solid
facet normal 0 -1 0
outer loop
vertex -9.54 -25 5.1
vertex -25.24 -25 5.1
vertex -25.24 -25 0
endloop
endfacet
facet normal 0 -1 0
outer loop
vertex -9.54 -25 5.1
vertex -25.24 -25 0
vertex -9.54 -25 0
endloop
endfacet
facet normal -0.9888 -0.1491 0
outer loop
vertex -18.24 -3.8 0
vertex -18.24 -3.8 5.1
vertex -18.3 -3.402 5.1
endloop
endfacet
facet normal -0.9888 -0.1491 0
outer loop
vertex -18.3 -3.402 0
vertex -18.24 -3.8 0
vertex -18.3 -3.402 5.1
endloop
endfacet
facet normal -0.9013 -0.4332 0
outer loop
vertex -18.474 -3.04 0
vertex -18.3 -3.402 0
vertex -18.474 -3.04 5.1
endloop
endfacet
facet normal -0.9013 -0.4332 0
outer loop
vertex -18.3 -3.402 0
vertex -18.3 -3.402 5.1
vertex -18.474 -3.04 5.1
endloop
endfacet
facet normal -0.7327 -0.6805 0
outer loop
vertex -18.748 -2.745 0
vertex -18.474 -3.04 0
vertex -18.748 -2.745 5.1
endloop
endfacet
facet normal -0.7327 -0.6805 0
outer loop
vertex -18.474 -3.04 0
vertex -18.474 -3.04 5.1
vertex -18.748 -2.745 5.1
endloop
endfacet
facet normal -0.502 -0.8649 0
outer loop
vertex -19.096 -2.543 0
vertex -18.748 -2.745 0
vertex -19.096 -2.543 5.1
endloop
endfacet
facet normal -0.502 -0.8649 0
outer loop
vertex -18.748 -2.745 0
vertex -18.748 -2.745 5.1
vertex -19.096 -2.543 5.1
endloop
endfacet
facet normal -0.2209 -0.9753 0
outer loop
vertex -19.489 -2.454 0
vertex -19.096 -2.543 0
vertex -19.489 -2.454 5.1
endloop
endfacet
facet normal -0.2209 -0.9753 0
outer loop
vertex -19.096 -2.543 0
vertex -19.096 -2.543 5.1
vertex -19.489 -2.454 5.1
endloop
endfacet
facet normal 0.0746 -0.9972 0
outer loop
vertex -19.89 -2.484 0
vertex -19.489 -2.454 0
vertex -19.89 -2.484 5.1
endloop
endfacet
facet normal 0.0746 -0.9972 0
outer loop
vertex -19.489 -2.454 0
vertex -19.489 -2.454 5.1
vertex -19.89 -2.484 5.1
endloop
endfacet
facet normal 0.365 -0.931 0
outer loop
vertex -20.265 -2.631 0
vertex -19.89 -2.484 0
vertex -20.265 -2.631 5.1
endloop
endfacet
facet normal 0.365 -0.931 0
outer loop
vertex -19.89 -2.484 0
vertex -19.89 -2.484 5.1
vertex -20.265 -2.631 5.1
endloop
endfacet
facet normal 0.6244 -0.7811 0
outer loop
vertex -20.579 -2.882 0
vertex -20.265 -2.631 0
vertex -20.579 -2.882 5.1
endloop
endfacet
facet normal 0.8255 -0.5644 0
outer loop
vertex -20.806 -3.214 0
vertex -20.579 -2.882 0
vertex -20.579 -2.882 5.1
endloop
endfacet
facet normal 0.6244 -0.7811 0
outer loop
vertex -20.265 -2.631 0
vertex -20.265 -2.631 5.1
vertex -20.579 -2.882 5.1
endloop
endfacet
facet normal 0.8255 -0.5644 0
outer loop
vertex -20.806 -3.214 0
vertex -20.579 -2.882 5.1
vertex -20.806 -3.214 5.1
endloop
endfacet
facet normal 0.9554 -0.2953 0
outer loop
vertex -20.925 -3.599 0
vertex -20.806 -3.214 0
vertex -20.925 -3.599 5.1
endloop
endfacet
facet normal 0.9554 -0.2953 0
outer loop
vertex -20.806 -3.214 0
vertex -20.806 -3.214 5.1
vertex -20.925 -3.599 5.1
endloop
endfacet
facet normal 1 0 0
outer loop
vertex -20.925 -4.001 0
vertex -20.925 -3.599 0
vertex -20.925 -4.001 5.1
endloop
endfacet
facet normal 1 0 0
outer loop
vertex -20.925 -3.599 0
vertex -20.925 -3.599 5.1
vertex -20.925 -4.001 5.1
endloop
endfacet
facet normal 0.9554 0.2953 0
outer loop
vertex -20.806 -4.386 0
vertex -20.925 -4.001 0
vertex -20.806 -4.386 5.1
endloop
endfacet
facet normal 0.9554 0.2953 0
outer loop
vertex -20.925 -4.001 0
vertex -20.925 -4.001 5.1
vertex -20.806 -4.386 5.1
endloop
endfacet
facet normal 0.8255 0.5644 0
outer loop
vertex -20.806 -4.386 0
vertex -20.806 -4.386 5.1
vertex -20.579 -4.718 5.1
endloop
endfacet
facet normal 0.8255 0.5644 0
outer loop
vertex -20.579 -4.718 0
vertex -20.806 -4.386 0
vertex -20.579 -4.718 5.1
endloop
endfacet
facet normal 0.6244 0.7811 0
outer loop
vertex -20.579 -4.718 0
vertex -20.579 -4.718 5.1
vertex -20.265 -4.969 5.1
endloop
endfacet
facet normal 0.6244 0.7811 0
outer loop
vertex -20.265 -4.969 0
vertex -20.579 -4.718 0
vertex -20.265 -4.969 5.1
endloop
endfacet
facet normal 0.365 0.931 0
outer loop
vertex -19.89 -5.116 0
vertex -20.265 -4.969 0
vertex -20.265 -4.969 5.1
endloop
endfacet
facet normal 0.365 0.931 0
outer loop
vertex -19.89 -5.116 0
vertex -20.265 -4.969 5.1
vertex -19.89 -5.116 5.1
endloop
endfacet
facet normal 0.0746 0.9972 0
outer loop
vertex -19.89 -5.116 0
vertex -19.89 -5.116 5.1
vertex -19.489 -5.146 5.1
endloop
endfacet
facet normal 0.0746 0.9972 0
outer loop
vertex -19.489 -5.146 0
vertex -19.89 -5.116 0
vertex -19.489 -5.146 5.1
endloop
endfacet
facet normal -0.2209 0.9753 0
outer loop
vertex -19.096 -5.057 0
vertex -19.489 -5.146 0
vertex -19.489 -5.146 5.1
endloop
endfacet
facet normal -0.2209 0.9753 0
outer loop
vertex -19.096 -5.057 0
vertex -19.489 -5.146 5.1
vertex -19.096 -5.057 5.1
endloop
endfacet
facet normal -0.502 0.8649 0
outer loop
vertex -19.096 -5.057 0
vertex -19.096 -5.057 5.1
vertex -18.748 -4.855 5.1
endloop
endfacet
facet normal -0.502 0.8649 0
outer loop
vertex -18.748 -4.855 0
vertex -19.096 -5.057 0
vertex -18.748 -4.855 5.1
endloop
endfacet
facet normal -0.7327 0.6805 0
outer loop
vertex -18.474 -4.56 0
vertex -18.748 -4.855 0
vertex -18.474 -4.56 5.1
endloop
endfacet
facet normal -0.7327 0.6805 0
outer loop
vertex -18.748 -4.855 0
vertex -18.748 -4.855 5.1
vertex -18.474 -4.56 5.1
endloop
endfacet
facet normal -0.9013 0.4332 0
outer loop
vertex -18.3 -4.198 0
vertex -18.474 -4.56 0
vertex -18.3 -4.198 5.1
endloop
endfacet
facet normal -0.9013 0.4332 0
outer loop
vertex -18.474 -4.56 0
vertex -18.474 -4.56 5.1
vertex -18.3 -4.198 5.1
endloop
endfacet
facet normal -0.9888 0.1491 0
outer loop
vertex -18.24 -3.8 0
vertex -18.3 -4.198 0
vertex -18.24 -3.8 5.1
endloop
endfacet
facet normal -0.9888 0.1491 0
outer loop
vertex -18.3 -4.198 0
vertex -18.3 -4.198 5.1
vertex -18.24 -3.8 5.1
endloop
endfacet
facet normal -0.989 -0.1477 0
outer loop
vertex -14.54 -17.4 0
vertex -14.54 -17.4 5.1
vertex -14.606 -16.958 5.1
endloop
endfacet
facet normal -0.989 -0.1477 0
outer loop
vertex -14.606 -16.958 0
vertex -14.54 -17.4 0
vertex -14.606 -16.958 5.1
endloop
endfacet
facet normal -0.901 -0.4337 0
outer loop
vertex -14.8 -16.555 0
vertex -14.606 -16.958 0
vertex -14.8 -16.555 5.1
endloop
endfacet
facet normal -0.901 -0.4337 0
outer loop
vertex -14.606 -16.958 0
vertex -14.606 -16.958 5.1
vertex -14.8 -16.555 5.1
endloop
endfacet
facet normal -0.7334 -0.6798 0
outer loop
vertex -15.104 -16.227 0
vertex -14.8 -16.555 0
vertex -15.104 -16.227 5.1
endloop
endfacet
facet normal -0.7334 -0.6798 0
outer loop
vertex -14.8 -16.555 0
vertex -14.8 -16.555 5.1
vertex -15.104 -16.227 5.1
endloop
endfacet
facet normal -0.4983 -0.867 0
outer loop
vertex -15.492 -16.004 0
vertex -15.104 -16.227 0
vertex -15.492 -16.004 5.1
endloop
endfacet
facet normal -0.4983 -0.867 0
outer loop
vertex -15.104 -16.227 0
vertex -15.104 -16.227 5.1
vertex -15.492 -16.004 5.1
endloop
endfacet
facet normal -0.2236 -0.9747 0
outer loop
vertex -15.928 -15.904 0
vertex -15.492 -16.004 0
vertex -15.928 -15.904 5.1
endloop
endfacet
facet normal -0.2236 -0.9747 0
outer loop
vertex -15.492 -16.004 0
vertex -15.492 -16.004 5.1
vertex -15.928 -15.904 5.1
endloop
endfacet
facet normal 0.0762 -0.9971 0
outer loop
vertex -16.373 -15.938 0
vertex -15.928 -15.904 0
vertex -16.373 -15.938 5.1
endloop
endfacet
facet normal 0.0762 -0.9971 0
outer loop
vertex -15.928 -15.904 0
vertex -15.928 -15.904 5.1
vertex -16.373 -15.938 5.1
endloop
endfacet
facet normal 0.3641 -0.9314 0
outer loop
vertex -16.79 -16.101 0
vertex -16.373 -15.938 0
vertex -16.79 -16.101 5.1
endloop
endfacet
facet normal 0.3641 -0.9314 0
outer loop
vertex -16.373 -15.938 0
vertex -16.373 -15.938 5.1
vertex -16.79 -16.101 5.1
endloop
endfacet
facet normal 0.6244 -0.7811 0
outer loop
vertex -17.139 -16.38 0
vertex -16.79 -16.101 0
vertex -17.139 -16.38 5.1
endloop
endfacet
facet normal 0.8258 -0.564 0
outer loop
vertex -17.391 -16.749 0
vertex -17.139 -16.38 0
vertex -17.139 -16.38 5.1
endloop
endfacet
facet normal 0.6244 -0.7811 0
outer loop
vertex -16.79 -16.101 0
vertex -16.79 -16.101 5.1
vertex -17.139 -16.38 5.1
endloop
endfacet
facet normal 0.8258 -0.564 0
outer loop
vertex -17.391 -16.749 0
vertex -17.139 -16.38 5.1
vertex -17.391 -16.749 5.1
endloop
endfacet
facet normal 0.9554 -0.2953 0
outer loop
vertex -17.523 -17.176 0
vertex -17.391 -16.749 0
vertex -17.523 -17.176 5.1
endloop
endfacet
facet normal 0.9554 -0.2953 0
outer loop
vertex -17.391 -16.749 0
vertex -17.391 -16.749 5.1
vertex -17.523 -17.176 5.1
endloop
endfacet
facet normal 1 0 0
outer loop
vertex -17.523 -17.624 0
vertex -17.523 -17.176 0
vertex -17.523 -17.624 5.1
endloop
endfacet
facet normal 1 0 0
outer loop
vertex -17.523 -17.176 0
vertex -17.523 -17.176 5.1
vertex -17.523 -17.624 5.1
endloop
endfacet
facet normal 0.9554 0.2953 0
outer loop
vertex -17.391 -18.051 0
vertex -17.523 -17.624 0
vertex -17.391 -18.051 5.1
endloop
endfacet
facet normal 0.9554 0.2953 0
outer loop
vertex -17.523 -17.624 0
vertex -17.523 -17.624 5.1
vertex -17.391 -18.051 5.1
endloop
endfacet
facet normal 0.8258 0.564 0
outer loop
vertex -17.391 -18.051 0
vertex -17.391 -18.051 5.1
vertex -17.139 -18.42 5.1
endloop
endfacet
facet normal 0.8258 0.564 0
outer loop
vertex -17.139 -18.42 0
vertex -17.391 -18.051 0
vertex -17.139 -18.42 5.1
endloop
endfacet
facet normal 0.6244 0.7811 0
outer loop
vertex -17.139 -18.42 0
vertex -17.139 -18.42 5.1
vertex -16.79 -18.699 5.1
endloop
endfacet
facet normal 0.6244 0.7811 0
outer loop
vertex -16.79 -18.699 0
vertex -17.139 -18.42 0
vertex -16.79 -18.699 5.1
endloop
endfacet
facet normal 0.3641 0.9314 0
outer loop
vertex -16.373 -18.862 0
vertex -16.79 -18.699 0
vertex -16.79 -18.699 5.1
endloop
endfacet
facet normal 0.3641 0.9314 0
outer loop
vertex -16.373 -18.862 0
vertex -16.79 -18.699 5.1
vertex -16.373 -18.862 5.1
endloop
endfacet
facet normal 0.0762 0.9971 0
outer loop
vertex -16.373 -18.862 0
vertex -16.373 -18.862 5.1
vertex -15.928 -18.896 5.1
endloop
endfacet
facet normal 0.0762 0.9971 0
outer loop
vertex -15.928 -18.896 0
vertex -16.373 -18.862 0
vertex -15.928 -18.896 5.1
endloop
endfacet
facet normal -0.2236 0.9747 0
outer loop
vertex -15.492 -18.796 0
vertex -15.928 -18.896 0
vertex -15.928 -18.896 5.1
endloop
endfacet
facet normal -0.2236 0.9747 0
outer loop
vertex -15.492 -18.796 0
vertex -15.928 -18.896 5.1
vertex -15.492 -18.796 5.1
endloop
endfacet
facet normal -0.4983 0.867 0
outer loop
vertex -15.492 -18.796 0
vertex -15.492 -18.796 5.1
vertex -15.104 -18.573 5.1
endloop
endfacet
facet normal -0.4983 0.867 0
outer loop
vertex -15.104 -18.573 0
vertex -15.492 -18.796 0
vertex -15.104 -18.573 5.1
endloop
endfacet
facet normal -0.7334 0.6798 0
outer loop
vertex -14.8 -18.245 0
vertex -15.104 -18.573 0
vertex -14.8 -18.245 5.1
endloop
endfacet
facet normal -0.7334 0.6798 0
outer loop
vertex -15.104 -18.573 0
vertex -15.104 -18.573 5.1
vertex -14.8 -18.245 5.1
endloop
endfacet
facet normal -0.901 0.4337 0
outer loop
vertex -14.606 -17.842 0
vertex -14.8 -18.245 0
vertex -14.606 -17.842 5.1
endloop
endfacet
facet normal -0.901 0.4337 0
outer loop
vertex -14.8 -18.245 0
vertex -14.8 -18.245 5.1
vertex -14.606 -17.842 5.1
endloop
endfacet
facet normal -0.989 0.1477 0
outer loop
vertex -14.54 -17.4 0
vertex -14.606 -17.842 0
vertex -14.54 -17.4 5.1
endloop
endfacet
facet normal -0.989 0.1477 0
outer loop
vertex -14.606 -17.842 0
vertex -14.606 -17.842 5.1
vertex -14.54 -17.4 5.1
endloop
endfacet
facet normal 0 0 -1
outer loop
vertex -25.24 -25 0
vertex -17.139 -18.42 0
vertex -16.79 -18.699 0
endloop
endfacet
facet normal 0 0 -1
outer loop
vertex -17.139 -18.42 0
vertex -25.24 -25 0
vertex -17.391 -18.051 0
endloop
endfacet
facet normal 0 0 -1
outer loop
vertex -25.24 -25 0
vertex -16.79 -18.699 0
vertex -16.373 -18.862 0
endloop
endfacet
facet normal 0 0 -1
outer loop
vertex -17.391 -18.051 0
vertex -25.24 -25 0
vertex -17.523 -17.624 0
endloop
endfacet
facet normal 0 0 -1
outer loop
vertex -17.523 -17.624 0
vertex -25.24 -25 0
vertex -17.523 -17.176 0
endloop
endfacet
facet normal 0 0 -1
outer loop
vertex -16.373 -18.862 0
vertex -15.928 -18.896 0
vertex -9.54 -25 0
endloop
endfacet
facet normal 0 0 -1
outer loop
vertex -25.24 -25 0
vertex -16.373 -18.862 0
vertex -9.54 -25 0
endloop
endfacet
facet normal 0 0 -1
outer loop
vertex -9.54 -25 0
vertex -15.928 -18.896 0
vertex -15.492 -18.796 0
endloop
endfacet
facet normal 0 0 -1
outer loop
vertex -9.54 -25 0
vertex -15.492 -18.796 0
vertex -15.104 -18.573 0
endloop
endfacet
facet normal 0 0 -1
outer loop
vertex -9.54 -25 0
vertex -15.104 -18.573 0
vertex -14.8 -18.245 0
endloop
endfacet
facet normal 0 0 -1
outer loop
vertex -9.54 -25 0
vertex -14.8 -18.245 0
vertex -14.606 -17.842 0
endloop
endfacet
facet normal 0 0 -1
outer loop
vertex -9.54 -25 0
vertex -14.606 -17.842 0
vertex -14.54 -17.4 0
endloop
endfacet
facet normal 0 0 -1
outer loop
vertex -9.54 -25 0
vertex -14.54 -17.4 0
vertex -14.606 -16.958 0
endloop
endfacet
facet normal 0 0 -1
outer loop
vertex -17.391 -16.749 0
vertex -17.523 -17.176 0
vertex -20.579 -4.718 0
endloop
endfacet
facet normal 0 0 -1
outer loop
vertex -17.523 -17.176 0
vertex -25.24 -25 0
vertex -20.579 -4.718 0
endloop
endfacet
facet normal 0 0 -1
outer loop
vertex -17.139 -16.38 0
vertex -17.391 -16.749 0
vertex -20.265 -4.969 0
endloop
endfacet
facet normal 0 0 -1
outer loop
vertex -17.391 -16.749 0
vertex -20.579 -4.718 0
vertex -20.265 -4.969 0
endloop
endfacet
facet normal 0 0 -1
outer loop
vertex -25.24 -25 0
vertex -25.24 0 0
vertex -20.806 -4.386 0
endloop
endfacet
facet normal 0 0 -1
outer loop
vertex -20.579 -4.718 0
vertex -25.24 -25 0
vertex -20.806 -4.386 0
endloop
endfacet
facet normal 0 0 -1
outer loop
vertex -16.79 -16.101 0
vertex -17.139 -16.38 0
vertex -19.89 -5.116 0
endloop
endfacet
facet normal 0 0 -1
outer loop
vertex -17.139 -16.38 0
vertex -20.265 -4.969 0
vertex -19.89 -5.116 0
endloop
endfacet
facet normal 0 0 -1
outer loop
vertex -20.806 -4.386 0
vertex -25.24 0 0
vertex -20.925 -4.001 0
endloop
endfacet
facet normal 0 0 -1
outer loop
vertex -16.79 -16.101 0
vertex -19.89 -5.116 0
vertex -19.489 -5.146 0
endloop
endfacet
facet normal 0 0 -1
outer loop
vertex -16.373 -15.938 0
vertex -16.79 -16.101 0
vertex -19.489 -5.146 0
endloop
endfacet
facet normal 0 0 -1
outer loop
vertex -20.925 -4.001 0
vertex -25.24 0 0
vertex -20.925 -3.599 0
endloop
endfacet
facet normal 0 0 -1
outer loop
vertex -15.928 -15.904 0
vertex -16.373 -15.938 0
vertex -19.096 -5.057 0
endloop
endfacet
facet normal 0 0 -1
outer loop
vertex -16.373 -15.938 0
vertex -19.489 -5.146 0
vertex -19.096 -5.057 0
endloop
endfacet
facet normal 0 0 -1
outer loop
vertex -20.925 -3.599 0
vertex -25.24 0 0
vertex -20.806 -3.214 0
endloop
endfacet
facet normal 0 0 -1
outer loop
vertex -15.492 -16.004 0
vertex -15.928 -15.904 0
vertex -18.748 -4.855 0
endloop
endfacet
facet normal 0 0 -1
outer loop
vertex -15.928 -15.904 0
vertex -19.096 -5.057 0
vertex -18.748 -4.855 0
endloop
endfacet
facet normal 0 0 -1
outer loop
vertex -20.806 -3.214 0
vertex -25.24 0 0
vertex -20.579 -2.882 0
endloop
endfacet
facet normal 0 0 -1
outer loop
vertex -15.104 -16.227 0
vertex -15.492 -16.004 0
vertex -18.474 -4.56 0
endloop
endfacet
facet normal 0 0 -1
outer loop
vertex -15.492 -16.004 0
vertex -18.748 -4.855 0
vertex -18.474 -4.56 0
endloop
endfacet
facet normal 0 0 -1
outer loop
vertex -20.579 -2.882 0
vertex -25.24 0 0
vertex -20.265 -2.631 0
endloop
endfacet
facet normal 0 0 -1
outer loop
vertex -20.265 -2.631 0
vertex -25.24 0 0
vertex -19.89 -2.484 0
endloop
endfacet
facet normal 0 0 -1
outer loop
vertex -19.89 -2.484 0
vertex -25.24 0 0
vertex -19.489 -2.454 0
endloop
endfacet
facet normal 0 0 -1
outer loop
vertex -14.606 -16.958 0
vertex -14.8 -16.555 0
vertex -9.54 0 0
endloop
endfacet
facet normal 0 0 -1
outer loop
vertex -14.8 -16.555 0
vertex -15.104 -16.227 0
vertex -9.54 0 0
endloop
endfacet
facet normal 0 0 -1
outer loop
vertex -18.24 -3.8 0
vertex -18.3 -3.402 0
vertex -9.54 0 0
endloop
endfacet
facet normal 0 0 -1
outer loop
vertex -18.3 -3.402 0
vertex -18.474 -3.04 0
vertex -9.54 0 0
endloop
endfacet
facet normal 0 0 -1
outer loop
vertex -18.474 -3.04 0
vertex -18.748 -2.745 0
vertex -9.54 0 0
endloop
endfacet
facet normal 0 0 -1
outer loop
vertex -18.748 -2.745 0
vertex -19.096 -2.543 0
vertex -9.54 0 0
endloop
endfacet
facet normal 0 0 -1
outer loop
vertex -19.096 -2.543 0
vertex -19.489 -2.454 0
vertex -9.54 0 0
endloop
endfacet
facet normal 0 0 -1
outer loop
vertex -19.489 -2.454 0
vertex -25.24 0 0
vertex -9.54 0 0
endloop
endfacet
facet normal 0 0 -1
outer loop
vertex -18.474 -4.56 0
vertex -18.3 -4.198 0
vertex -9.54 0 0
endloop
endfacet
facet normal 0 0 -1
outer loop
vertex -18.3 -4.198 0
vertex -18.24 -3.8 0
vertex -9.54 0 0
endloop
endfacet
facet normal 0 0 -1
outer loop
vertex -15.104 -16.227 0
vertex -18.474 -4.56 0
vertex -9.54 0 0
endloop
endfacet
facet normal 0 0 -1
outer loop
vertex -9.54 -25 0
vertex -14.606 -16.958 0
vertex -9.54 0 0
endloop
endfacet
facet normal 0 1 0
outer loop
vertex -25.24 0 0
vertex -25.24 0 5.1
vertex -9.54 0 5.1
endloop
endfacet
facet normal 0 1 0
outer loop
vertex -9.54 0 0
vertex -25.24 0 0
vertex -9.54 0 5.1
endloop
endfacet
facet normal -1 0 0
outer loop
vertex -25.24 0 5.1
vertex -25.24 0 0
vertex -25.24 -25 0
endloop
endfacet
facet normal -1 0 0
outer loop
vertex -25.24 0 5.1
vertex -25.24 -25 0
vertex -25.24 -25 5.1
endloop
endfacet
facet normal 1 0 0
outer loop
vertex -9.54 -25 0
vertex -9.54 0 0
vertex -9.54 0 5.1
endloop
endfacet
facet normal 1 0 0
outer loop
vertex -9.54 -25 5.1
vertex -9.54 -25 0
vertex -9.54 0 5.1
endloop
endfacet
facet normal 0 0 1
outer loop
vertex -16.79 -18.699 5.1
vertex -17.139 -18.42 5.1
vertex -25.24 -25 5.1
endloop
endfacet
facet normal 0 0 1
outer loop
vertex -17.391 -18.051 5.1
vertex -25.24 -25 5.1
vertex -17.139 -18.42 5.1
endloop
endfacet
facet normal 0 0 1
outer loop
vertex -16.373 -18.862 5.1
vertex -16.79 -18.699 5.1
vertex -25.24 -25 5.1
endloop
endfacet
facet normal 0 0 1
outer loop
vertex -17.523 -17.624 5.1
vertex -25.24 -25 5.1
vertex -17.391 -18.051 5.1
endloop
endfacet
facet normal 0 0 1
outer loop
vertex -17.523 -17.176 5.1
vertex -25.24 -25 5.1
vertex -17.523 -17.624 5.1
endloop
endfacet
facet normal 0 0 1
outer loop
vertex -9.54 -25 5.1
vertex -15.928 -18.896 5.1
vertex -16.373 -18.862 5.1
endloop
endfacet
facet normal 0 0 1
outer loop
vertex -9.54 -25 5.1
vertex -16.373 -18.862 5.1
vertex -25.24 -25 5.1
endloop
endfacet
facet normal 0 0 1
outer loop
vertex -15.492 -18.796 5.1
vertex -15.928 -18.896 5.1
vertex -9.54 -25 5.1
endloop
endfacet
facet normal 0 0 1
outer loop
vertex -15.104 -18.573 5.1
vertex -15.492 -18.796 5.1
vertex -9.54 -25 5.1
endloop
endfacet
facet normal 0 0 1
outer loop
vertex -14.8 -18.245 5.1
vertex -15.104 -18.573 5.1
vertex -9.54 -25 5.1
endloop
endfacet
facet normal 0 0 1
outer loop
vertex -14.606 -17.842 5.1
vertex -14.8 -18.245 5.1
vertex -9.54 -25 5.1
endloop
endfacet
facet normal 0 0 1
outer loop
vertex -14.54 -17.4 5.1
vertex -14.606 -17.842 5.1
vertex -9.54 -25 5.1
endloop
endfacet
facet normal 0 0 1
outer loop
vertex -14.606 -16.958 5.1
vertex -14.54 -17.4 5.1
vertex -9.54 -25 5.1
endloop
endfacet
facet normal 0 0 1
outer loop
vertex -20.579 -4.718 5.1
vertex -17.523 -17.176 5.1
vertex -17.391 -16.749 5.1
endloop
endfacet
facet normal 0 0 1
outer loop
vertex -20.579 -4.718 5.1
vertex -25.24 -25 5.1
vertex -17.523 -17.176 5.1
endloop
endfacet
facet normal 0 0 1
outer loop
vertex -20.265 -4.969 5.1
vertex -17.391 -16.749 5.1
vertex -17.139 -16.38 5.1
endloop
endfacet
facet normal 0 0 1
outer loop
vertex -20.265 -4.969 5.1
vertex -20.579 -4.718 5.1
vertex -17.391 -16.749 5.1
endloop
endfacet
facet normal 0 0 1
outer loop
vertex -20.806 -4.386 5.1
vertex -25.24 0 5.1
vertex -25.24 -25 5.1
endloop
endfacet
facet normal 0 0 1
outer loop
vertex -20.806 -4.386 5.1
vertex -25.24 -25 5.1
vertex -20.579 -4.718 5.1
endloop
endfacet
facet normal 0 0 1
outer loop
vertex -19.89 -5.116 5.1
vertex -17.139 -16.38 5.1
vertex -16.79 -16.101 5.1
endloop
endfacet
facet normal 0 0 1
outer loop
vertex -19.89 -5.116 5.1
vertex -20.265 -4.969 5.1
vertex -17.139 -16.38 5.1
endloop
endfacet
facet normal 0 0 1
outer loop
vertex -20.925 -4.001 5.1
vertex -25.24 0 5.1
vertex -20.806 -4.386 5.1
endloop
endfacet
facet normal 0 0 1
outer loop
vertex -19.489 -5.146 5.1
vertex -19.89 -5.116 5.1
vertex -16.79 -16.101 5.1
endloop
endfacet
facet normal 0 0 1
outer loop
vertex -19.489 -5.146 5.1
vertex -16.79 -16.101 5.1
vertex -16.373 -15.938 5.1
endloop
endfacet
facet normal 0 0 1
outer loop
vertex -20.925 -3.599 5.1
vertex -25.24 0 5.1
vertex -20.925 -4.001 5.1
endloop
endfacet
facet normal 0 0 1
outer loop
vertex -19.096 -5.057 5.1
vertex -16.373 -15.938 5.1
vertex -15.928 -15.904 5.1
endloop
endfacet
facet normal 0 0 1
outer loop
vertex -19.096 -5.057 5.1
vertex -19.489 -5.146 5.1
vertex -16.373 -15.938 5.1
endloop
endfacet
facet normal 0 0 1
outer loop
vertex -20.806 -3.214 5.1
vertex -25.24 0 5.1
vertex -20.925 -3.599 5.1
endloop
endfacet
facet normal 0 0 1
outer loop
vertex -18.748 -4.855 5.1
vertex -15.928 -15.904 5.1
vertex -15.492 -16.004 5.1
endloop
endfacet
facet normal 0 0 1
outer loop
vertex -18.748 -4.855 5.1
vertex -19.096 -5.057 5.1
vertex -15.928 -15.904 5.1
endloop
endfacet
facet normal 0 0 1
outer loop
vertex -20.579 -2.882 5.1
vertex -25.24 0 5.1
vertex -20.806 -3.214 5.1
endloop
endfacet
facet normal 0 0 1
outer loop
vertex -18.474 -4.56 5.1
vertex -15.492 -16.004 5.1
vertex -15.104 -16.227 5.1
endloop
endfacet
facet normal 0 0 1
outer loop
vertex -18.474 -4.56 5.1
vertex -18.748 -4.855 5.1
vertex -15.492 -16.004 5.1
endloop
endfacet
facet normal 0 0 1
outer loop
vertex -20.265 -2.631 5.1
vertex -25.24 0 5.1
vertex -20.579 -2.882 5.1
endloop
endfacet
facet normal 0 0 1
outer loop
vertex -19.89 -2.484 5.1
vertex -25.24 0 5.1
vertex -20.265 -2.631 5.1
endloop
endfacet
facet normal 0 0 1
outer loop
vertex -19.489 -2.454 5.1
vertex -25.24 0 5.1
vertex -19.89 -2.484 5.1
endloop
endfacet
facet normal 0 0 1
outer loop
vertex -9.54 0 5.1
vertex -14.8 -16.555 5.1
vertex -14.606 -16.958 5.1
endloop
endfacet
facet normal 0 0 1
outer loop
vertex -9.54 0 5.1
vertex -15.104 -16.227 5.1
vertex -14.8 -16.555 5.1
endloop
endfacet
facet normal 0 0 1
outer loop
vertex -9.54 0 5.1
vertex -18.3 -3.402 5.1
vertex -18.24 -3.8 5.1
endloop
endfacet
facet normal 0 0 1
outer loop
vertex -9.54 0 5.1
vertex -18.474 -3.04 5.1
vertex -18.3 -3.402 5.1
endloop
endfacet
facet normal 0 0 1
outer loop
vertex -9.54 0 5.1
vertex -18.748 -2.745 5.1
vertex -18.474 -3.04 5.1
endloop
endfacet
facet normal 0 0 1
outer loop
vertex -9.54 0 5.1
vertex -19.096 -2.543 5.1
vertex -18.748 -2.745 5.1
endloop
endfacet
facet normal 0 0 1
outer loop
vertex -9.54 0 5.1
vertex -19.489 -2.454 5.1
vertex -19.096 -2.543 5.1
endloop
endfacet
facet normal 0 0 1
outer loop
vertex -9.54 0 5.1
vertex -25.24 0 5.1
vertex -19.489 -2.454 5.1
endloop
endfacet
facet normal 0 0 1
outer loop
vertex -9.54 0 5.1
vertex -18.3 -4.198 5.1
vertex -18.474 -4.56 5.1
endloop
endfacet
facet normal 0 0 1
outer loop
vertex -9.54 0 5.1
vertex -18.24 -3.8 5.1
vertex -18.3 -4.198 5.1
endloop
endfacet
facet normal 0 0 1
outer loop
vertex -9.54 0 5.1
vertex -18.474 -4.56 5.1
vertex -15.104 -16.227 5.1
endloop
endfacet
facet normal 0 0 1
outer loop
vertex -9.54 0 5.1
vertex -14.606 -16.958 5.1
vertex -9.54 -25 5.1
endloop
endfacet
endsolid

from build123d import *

# Parameters (mm, degrees)
F0_W     = 15.7
F0_H     = 5.1
F1_DEPTH = 25
F2_R     = 1.35
F3_DEPTH = 5.1
F4_R     = 1.5
F5_DEPTH = 5.1


with BuildPart() as f1:
    # F0 (on Front) → F1 (new body)
    with BuildSketch(Plane.XZ):
        with Locations((-17.389617, 2.55)):
            Rectangle(F0_W, F0_H)
    extrude(amount=F1_DEPTH)

    # F2 (on face) → F3 (cut)
    with BuildSketch(Plane.XY.offset(5.1)):
        with Locations((-19.589617, -3.8)):
            Circle(F2_R)
    extrude(amount=-F3_DEPTH, mode=Mode.SUBTRACT)

    # F4 (on face) → F5 (cut)
    with BuildSketch(Plane.XY.offset(5.1)):
        with Locations((-16.039617, -17.4)):
            Circle(F4_R)
    extrude(amount=-F5_DEPTH, mode=Mode.SUBTRACT)


solid = f1.part
